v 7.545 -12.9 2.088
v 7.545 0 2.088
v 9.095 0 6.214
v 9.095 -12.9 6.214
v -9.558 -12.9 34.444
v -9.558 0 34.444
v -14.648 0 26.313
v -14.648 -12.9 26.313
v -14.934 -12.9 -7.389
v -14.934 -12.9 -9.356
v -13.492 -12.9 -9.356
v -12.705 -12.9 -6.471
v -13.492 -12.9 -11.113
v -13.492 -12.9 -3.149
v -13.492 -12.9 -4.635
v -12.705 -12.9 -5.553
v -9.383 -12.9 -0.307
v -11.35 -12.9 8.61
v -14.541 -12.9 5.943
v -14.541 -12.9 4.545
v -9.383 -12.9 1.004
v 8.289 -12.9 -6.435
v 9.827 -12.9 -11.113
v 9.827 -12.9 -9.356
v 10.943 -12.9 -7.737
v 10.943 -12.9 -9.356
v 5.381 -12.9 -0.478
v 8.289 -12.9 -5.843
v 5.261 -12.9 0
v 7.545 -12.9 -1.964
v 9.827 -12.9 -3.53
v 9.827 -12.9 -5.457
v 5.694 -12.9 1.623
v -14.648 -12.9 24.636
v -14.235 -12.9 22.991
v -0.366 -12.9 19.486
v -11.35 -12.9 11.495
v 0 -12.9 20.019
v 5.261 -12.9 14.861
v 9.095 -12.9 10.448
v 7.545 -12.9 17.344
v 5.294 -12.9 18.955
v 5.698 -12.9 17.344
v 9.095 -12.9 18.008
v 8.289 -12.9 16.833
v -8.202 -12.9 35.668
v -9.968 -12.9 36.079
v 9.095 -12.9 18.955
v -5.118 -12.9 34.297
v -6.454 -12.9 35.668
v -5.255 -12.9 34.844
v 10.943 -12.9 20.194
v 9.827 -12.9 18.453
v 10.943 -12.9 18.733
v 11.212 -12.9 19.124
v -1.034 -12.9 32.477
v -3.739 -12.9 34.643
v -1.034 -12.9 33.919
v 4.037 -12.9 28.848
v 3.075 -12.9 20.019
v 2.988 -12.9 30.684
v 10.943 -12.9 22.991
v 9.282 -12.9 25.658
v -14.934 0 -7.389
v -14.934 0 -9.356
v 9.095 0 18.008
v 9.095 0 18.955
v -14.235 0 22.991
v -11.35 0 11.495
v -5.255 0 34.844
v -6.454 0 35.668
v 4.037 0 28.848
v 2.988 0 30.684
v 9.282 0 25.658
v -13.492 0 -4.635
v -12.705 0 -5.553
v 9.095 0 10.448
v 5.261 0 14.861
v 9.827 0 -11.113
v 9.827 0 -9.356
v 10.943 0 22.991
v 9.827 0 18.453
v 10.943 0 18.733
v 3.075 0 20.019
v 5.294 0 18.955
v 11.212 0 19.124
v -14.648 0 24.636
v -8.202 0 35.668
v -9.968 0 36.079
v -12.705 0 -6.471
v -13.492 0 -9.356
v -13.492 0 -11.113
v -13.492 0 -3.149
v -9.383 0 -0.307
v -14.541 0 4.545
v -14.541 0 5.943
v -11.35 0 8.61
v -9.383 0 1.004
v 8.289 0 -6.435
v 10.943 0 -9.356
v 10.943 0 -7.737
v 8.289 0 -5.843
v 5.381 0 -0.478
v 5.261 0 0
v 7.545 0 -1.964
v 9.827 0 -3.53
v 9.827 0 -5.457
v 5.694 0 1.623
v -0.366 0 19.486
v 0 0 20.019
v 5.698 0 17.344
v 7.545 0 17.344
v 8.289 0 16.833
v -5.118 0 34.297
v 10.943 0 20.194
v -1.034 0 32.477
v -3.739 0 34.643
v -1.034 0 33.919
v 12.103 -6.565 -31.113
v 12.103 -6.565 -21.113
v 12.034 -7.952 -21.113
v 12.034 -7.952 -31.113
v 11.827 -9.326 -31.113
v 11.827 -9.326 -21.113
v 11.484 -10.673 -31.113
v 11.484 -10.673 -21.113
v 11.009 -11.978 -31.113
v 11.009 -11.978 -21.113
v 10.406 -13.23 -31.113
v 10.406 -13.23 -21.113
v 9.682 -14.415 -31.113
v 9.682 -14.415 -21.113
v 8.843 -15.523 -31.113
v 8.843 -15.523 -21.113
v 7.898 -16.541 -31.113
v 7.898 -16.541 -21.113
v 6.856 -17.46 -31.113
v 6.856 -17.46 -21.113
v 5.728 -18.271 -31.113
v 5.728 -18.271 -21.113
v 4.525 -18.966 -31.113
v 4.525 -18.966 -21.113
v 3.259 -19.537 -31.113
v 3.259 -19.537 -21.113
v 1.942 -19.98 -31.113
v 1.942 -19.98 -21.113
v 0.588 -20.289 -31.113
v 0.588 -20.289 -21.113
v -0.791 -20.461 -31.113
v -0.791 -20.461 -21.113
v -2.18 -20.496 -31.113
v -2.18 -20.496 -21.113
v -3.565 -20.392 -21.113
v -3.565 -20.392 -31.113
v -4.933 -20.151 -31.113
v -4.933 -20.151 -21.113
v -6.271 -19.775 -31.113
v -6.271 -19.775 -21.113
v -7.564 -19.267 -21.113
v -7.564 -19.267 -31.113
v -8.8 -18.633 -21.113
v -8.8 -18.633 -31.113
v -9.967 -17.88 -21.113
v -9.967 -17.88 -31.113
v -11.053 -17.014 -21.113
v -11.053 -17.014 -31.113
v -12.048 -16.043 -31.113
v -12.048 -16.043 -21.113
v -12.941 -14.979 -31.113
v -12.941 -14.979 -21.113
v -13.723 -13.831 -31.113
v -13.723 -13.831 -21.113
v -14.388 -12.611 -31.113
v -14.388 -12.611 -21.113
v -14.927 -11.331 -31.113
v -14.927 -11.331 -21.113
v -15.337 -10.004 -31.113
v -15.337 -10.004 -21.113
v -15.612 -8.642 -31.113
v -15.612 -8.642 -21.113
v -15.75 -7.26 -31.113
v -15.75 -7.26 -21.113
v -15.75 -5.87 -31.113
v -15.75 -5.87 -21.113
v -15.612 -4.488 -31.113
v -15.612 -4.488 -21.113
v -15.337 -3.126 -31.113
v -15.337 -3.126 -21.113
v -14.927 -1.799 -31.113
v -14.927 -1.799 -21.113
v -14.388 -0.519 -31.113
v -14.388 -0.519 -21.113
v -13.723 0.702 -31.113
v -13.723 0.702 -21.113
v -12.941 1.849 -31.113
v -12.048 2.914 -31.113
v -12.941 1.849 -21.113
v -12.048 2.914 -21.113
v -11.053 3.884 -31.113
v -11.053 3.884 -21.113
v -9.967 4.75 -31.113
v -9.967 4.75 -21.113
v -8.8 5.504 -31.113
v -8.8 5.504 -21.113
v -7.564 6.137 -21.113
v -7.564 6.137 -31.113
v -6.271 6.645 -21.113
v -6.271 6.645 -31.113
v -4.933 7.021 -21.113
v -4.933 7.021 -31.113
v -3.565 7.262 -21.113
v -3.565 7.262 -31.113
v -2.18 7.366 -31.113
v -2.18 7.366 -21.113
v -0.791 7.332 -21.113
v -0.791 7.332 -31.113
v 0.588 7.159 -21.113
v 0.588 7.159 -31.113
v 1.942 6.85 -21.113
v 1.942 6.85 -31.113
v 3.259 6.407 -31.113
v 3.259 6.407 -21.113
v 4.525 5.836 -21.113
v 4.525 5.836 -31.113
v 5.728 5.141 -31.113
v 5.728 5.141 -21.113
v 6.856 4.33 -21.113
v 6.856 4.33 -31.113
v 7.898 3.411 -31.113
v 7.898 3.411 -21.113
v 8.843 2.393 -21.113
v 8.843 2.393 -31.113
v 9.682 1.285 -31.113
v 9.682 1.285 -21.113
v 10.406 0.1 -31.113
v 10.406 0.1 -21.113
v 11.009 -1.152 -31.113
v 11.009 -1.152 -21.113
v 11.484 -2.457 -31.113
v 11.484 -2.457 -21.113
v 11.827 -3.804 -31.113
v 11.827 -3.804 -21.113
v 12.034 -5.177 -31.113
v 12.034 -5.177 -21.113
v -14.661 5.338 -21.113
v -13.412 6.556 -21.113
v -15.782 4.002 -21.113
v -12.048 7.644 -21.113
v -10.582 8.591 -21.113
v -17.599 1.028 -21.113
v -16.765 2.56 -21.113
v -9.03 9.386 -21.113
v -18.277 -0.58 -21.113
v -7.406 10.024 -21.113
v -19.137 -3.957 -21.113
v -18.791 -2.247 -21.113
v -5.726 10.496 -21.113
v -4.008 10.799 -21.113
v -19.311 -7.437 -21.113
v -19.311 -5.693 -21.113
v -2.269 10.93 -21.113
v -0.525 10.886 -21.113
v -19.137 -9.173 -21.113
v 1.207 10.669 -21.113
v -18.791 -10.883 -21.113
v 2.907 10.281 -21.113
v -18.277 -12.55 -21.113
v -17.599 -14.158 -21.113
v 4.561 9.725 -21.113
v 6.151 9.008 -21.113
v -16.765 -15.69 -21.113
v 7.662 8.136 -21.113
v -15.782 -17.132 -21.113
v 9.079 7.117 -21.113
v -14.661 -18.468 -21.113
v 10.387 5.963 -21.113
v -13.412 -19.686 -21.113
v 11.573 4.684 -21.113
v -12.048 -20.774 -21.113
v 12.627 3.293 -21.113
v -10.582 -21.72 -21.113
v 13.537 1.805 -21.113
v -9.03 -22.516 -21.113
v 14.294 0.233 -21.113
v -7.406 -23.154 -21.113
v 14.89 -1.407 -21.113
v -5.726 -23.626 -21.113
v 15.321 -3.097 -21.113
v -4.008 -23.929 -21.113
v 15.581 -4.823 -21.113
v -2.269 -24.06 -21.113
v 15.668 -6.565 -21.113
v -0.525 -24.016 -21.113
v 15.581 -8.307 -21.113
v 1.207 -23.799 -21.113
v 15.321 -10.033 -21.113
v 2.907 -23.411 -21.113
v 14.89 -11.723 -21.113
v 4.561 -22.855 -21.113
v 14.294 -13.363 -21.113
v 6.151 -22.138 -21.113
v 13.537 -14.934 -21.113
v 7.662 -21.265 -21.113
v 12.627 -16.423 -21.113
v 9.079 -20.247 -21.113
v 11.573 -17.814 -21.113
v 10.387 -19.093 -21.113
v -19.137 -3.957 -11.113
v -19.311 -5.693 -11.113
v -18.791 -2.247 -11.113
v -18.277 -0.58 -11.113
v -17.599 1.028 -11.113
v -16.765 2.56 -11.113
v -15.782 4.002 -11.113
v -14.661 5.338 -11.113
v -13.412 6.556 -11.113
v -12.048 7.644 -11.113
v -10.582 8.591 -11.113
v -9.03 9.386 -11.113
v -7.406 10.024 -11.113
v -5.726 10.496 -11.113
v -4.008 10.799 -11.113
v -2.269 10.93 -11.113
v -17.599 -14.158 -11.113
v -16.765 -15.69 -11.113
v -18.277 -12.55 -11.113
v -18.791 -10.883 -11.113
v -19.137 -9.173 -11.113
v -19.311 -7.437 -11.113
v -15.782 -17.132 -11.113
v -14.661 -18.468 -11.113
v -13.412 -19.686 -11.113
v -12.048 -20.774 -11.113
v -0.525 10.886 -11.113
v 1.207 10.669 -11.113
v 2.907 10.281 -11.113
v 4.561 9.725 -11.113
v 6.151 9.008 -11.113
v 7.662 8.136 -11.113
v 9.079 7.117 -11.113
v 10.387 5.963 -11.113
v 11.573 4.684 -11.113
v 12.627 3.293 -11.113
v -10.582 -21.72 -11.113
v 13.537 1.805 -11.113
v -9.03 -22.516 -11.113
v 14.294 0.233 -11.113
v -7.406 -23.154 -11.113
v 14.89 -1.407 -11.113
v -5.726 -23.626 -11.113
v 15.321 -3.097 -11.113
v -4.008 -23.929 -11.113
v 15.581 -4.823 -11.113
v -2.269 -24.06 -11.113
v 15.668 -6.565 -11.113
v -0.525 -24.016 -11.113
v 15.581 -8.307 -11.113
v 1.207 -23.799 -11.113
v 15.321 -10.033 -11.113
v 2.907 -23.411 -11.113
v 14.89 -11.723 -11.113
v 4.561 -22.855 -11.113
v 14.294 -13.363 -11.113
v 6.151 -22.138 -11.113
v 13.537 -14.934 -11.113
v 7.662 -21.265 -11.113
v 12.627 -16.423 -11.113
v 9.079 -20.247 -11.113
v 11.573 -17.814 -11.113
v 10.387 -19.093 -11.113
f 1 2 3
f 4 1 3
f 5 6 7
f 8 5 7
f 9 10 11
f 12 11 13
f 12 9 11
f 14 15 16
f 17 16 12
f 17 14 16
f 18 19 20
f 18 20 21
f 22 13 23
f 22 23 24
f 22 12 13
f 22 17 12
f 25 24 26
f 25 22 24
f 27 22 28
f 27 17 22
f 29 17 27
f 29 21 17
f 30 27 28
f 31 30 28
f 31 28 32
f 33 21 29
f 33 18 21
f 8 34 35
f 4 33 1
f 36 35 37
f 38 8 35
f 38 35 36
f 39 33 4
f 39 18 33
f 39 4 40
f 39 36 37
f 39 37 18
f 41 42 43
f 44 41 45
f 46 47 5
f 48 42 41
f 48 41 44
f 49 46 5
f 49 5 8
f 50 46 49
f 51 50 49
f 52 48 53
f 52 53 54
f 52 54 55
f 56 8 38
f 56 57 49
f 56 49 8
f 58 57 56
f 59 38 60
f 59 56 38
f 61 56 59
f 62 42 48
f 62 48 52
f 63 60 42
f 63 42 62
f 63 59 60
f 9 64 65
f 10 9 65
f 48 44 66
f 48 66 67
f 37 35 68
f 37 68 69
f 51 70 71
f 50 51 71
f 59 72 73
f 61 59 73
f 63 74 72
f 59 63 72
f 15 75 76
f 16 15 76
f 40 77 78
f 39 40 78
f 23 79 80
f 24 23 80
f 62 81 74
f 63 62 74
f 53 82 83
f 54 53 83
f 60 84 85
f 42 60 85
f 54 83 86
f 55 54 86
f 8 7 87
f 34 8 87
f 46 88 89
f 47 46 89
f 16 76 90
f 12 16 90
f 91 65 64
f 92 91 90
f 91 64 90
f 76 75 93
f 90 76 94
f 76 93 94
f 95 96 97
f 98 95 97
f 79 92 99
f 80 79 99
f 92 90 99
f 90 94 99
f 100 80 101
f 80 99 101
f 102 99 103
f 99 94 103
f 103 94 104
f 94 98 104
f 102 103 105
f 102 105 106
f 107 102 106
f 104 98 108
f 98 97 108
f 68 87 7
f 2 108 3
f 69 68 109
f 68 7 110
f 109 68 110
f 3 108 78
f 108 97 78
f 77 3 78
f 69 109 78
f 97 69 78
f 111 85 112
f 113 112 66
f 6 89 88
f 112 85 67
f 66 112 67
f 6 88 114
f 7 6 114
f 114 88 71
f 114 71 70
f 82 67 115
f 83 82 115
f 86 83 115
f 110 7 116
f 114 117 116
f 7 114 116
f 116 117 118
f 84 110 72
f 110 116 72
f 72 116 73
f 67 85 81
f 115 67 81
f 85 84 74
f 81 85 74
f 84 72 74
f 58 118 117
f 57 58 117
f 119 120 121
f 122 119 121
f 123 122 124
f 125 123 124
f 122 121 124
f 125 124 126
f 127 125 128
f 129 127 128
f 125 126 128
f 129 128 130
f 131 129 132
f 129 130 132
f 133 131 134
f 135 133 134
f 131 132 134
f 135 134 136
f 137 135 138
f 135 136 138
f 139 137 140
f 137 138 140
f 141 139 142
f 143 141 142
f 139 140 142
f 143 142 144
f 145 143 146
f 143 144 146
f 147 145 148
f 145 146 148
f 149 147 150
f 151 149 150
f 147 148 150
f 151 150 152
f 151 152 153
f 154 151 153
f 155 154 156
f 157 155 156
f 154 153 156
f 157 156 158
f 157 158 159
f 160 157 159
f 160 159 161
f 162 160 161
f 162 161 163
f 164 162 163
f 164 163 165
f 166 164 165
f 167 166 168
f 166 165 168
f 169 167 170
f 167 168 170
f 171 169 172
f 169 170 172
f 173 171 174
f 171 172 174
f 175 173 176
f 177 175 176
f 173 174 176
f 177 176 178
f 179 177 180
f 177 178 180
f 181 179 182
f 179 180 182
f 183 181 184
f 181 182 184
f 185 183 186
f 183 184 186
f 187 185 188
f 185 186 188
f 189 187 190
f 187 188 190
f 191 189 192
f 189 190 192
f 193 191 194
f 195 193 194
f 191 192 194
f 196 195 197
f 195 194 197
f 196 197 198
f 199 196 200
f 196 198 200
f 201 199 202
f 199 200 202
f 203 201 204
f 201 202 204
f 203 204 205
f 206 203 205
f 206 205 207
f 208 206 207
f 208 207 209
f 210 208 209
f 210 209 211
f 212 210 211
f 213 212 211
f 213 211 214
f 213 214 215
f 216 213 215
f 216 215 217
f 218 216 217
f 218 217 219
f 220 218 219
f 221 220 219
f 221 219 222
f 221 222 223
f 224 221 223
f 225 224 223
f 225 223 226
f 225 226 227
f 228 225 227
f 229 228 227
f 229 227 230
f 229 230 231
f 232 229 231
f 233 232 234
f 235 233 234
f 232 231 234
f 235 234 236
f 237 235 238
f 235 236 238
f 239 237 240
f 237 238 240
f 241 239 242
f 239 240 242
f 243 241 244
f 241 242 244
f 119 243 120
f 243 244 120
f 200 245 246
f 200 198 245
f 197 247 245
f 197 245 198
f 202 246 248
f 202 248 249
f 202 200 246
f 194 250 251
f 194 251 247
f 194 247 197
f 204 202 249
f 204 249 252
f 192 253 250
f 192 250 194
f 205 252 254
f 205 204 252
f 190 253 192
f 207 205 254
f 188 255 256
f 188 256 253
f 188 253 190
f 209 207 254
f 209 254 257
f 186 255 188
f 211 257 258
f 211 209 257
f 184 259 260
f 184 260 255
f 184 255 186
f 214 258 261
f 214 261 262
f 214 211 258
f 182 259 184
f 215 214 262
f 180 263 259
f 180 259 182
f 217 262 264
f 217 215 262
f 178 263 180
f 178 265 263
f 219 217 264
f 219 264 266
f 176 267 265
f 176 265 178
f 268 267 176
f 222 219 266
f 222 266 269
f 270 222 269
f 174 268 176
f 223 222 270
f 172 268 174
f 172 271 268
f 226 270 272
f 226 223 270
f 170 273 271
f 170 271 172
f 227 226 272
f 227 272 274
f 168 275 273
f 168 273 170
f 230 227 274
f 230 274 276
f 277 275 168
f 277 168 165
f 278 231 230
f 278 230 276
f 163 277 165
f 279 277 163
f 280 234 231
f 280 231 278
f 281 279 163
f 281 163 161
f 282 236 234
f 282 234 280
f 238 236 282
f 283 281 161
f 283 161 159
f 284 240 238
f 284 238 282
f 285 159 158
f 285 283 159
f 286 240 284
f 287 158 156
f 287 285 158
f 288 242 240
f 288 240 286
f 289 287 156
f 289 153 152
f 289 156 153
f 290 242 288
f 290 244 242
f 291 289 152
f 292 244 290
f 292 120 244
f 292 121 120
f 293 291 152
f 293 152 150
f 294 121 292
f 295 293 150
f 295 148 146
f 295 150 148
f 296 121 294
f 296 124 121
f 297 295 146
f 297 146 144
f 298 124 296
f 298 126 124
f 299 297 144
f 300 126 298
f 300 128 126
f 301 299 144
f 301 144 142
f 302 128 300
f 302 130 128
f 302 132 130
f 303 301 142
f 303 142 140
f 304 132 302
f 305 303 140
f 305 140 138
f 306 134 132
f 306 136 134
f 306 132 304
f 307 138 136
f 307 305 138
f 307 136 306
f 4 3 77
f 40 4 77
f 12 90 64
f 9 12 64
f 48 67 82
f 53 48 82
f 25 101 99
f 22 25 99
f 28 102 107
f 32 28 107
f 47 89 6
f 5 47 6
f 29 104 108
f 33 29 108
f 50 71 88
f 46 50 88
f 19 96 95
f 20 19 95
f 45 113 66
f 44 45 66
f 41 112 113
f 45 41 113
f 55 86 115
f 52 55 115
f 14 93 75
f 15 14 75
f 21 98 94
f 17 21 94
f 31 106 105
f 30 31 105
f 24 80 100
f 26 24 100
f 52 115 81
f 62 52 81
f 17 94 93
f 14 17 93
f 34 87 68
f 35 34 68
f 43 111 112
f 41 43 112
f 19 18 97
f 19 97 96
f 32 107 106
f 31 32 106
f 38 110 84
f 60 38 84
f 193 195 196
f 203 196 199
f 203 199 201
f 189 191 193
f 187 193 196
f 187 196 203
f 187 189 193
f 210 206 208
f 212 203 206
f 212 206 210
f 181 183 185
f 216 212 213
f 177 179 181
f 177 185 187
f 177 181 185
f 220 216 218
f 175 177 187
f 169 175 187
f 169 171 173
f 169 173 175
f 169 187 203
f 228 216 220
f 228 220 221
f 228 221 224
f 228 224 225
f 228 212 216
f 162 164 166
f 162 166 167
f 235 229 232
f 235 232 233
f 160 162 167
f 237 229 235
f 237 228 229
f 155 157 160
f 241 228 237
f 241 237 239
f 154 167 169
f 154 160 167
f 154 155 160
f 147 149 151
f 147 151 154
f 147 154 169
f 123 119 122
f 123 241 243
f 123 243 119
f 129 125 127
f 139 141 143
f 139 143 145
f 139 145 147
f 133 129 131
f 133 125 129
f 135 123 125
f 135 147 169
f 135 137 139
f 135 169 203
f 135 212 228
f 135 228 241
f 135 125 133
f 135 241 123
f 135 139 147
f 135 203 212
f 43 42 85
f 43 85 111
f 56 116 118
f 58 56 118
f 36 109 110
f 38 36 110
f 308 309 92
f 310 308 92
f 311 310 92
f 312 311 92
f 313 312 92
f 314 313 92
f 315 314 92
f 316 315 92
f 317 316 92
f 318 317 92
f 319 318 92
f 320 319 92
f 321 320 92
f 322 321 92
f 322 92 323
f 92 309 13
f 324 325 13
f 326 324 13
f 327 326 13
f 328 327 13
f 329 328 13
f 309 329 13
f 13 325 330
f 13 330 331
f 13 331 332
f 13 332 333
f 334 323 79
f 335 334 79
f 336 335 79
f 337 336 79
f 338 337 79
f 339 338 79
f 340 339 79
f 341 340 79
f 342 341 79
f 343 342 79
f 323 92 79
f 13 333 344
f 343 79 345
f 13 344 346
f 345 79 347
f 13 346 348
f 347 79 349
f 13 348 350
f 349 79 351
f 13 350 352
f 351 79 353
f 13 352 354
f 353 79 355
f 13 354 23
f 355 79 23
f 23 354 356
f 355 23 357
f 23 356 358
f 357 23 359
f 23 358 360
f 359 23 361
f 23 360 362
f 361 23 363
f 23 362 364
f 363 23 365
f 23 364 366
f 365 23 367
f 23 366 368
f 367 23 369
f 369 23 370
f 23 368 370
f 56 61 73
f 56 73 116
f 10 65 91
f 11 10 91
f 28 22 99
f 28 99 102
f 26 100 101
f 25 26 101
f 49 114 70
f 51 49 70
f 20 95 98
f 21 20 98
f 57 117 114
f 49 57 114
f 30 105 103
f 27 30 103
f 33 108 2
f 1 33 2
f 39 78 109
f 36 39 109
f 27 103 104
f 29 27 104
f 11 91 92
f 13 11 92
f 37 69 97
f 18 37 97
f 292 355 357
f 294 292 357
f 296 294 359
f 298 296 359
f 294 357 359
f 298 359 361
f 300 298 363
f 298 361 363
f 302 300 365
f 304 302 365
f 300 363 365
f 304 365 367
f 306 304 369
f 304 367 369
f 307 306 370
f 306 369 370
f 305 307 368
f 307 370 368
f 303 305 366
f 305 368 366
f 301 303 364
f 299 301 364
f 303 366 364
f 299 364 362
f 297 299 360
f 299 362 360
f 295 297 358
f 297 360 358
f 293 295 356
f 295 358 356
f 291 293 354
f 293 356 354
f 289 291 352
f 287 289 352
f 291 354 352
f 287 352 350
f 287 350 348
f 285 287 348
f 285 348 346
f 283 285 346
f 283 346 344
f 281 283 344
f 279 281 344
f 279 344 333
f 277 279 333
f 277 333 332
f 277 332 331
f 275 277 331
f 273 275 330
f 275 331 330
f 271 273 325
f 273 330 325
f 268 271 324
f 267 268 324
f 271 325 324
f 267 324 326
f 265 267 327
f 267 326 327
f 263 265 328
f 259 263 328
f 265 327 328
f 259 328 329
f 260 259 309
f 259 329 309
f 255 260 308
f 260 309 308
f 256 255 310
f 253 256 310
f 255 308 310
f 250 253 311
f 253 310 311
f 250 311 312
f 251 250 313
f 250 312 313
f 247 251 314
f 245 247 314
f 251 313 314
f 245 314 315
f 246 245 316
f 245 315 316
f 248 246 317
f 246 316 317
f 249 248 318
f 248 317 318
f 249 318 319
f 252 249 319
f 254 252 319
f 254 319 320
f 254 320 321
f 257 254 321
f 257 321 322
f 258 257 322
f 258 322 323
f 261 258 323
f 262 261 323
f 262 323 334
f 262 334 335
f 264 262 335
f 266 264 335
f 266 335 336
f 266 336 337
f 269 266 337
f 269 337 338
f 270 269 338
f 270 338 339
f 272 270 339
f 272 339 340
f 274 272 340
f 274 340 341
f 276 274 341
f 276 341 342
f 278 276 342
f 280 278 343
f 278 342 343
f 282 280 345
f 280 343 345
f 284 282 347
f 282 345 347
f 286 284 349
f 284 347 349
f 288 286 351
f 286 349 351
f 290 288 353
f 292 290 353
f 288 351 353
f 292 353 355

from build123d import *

# Parameters (mm, degrees)
F1_DEPTH = 12.9
F2_R     = 17.5
F3_DEPTH = 10
F4_R     = 13.9355
F5_DEPTH = 10


with BuildPart() as f1:
    # F0 (on Front) → F1 (new body)
    with BuildSketch(Plane.XZ):
        Polygon((-13.491611, -11.113448), (0, -11.113448), (9.827, -11.113448), (9.827, -9.355818), (10.943413, -9.355818), (10.943413, -7.737426), (8.289084, -6.434524), (8.289084, -5.843352), (9.827, -5.457411), (9.827, -3.530073), (7.544932, -1.963569), (5.381204, -0.478298), (5.261175, 0), (5.69396, 1.623498), (7.544932, 2.088001), (9.09538, 6.213676), (9.09538, 10.447838), (5.261175, 14.860648), (-0.365813, 19.485754), (0, 20.018667), (3.075247, 20.018667), (5.29399, 18.955297), (5.698295, 17.344206), (7.544932, 17.344206), (8.289084, 16.83339), (9.09538, 18.007995), (9.09538, 18.955297), (9.827, 18.453084), (10.943413, 18.733248), (11.211763, 19.124179), (10.943413, 20.193515), (10.943413, 21.15518), (10.943413, 21.767149), (10.943413, 22.991084), (9.282355, 25.65752), (4.036912, 28.848497), (2.987823, 30.684402), (-1.033684, 32.476597), (-1.033684, 33.919092), (-3.738808, 34.642849), (-5.1175, 34.296865), (-5.254929, 34.844498), (-6.453976, 35.667572), (-8.202457, 35.667572), (-9.967883, 36.078834), (-9.557529, 34.443635), (-14.647621, 26.313199), (-14.647621, 24.636446), (-14.234716, 22.991084), (-11.349722, 11.494819), (-11.349722, 8.609826), (-14.5407, 5.943392), (-14.5407, 4.544607), (-9.38268, 1.003933), (-9.38268, -0.307428), (-13.491611, -3.14871), (-13.491611, -4.634919), (-12.704795, -5.552872), (-12.704795, -6.470824), (-14.934109, -7.388777), (-14.934109, -9.355818), (-13.491611, -9.355818), align=None)
    extrude(amount=F1_DEPTH)

    # F2 (on face) → F3 (join)
    with BuildSketch(Plane(origin=(0, 0, -11.113448), x_dir=(1, 0, 0), z_dir=(0, 0, -1))):
        with Locations((-1.832305, 6.564944)):
            Circle(F2_R)
    extrude(amount=F3_DEPTH)

    # F4 (on face) → F5 (join)
    with BuildSketch(Plane(origin=(0, 0, -21.113448), x_dir=(1, 0, 0), z_dir=(0, 0, -1))):
        with Locations((-1.832305, 6.564944)):
            Circle(F4_R)
    extrude(amount=F5_DEPTH)


solid = f1.part
